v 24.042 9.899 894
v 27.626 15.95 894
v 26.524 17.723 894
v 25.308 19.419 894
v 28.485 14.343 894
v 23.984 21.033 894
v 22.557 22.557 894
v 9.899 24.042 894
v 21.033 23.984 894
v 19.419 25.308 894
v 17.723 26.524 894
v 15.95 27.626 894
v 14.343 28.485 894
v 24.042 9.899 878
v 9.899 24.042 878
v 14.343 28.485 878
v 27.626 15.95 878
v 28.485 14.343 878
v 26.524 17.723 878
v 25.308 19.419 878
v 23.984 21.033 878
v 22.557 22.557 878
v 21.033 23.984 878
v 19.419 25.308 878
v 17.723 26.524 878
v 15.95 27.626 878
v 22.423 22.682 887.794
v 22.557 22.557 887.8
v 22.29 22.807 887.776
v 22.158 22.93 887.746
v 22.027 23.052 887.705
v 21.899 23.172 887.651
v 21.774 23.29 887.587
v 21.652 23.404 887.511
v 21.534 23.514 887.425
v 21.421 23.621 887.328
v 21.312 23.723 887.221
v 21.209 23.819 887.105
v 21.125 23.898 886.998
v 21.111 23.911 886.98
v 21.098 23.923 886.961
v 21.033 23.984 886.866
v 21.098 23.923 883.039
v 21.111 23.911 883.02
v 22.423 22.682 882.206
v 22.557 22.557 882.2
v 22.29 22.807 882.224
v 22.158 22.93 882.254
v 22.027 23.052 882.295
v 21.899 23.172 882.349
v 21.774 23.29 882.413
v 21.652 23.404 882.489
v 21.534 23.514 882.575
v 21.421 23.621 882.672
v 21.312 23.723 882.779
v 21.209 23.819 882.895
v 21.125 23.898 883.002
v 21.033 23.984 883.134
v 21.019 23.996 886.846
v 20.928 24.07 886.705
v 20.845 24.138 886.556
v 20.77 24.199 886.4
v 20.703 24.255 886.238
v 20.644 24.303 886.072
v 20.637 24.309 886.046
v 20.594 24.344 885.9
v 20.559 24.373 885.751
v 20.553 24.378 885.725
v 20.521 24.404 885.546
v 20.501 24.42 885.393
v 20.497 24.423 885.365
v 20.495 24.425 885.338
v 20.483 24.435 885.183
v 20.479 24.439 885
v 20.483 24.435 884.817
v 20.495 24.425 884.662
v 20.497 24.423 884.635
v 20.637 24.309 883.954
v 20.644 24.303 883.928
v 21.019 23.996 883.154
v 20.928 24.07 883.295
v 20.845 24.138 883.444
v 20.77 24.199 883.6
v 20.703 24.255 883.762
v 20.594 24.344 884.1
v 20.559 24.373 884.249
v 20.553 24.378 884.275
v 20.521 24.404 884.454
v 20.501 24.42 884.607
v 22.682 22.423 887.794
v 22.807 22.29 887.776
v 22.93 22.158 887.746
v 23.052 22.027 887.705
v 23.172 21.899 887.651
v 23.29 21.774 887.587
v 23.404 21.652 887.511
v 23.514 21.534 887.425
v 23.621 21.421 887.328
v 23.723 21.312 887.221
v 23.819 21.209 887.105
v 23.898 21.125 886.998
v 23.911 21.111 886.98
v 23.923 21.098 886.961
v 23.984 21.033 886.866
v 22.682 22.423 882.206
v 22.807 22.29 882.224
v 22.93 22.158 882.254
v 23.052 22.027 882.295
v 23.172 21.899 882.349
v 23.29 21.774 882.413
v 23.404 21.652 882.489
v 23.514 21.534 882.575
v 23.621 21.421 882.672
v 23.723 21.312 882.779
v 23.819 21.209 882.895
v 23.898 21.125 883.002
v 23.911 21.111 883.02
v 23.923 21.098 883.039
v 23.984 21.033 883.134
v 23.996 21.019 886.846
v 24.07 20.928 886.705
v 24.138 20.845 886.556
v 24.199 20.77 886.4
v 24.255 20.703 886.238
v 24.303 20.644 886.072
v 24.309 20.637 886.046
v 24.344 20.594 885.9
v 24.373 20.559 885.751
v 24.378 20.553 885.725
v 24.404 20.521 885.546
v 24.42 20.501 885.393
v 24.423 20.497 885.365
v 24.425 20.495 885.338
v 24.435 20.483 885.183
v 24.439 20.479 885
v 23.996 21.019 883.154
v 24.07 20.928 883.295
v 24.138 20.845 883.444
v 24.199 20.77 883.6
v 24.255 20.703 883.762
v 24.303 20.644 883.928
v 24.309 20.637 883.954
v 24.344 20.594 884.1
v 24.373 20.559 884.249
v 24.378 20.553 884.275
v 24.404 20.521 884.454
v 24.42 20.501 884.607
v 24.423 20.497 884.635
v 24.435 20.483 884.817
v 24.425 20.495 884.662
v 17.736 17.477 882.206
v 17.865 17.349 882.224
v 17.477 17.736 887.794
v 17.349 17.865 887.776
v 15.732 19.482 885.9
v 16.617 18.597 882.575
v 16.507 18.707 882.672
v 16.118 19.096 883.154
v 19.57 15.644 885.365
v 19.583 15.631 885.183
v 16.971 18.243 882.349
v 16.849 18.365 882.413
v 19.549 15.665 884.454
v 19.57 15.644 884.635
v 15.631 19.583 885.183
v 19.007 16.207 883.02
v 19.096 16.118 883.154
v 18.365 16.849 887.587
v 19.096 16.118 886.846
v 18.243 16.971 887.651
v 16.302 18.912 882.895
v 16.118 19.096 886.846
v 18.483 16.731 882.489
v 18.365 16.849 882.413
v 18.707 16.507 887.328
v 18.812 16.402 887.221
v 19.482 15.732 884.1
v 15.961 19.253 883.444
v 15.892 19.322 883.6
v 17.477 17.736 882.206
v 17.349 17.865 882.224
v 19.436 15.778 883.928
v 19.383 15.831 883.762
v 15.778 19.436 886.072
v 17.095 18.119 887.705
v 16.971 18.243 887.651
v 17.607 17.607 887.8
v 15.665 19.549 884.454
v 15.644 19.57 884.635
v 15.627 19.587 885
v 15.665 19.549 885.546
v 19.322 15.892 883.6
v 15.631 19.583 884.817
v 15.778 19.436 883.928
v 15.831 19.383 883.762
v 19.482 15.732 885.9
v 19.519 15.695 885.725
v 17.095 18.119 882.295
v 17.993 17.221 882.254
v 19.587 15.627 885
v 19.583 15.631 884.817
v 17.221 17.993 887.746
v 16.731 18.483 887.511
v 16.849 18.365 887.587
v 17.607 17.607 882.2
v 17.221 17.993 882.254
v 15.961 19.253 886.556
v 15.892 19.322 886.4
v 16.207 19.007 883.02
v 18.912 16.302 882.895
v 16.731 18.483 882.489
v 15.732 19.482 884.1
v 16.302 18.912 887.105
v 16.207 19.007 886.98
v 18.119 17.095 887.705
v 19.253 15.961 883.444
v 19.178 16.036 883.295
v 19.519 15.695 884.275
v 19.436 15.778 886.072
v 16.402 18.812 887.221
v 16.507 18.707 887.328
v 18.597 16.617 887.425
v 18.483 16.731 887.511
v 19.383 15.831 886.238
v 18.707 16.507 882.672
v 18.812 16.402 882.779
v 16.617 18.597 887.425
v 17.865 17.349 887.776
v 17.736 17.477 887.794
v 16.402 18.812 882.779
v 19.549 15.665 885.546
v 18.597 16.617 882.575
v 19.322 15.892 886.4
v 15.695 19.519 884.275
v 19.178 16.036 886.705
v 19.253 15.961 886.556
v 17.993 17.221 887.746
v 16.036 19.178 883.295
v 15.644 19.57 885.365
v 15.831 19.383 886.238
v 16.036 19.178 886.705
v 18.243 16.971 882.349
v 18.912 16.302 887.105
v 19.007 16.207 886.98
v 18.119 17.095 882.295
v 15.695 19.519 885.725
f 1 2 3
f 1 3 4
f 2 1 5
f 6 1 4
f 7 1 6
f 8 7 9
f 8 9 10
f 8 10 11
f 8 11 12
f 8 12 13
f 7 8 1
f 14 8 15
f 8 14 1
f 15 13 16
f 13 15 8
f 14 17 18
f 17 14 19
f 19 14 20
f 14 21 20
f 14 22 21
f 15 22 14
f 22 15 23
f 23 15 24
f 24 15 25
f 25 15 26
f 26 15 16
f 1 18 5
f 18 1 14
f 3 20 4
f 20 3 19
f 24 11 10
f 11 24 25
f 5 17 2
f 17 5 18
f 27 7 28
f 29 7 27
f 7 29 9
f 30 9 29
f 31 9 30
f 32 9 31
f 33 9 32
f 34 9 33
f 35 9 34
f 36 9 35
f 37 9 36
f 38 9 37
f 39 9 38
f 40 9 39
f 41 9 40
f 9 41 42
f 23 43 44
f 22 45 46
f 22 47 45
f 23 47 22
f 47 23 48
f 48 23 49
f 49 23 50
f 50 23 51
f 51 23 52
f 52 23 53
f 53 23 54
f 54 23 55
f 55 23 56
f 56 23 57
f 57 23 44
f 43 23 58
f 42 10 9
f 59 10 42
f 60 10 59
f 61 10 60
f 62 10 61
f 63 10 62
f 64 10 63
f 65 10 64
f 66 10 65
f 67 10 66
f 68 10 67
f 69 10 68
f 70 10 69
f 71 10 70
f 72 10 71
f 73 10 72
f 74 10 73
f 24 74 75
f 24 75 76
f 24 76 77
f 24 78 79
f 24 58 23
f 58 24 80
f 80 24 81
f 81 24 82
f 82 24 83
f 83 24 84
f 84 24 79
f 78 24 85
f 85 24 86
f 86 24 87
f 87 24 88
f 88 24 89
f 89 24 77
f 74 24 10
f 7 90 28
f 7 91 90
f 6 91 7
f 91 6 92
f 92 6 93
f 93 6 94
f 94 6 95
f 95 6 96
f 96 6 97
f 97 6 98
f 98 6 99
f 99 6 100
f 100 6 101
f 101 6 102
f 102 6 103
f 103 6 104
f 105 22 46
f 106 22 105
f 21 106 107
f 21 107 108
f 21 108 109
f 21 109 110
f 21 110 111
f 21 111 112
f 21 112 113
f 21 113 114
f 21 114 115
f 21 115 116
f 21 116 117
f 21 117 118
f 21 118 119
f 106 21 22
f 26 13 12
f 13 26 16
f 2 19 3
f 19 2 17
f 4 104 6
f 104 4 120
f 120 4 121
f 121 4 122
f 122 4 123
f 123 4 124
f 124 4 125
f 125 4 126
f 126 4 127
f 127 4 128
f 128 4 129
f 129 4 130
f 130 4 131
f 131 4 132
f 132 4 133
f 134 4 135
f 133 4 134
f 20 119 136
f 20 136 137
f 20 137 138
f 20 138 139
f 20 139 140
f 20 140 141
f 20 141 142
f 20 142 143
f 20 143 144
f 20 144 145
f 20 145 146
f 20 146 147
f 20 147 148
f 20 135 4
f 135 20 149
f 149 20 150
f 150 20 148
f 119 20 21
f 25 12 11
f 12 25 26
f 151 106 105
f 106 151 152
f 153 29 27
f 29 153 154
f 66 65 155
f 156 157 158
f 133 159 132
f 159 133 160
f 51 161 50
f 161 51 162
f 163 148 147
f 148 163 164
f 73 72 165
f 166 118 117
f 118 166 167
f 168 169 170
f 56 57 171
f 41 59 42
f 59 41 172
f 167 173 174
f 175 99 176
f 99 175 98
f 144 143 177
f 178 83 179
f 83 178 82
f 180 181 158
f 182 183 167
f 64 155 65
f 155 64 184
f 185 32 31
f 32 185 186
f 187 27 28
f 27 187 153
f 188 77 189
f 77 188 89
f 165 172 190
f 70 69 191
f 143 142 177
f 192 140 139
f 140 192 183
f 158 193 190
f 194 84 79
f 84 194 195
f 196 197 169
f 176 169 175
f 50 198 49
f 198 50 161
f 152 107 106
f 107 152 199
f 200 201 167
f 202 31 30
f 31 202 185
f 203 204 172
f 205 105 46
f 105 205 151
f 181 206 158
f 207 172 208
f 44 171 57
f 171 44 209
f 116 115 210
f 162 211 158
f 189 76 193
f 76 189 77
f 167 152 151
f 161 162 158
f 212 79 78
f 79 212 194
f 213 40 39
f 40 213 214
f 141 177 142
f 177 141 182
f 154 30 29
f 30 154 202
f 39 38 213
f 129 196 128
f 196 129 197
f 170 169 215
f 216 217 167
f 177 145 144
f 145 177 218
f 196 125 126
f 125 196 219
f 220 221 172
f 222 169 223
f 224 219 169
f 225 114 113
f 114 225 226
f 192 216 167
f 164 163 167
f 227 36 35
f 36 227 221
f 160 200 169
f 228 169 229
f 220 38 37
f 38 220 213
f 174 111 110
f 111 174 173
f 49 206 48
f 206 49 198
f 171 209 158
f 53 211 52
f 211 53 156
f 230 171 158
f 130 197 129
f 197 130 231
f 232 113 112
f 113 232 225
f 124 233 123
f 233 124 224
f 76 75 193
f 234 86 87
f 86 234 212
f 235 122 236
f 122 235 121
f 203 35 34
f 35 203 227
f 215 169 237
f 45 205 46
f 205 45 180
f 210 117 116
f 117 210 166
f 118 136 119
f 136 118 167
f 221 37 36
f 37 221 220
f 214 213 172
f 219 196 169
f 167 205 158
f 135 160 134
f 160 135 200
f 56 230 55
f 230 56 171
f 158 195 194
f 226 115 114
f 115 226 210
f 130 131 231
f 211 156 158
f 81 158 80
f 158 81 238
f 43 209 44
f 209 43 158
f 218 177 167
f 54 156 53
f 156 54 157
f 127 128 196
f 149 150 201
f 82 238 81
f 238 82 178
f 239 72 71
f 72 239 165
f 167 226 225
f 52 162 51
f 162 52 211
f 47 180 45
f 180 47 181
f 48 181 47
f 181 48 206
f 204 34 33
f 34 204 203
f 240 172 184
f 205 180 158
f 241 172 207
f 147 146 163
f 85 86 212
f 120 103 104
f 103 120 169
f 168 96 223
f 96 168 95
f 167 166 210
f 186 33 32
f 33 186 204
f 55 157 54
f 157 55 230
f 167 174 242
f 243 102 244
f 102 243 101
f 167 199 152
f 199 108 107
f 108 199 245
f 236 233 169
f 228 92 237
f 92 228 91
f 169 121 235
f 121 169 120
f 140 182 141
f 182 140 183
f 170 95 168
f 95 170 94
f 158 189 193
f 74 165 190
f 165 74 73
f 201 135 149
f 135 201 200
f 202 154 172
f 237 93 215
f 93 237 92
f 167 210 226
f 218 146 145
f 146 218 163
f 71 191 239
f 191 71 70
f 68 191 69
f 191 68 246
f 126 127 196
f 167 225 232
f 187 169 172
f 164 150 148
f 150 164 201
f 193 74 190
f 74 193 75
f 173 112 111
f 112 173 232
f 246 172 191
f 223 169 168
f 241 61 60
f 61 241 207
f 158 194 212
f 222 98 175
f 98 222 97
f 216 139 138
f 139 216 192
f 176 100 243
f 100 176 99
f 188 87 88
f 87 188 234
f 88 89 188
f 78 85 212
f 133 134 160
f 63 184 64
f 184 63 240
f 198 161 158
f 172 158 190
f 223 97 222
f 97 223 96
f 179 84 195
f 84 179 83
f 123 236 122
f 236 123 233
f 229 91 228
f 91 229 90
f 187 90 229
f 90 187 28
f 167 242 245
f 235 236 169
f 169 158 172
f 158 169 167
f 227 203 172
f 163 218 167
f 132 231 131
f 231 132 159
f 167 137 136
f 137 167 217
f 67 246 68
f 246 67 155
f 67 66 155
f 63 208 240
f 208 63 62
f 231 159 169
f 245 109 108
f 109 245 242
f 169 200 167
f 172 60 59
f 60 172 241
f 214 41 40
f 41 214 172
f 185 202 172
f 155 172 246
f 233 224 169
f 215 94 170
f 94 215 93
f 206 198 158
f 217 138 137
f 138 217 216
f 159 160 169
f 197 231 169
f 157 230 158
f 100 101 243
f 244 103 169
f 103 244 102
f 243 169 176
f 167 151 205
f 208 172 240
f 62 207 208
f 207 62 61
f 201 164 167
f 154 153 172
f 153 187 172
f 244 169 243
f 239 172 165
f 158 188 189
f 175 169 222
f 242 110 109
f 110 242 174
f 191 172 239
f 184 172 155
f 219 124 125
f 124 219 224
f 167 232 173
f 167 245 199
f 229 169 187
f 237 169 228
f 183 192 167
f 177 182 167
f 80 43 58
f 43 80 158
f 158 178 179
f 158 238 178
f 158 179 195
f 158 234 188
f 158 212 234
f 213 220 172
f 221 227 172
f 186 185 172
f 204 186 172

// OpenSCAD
// file: ../lib/astra66_core.scad
// =============================================================================
// ASTRA-66 CAD rev B -- core library
// Parameters (generated from analysis.py by build.py), derived stations and helpers.
// Every part file includes this; stations mirror analysis.py X[] exactly.
//
// Frame: rocket axis = +Z, STA 0 = nose tip, stations increase aft.
// Angles: measured about +Z from +X toward +Y.  90 deg = switch / hatch side,
// 270 deg = camera side, 45 deg = rail-button line, fins at 0/90/180/270 deg.
// =============================================================================
include <../astra66_params.scad>

$fn = FN;
EPS = 0.01;
CAD_REV = "B";

// ----------------------------------------------------------------- radii
R_OD    = BODY_OD / 2;                 // body tube outer
R_ID    = BODY_ID / 2;                 // body tube inner
R_SH    = (BODY_ID - FIT_SH) / 2;      // printed shoulder / ring OD radius
R_SI    = R_SH - NC_SH_WALL;           // nose shoulder inner radius
R_CO    = CPL_OD / 2;                  // coupler outer
R_CI    = CPL_ID / 2;                  // coupler inner
R_BH_IN = (CPL_ID - 0.2) / 2;          // inner bulkhead disc (fits in coupler)
R_MO    = MMT_OD / 2;
R_MI    = MMT_ID / 2;
R_RING_BORE = (MMT_OD + FIT_SH) / 2;   // centering-ring / core bore
R_TAB_FLOOR = max(R_MO, RET_CLEAR_D / 2);          // rev B: tab clears the COTS retainer
FIN_TAB_H   = R_OD - R_TAB_FLOOR - FIN_TAB_CLR;

// ----------------------------------------------------------------- stations
X_NC_BASE     = NC_L;
X_SH_END      = NC_L + NC_SH_L;
X_PL_END      = NC_L + PL_L;
X_BAND_END    = X_PL_END + AV_BAND_L;
X_END         = X_BAND_END + BO_L;
L_OVERALL     = X_END;                              // airframe length (excl. COTS retainer)
X_CPL_FWD     = X_PL_END - AV_INS;
X_CPL_AFT     = X_BAND_END + AV_INS;
X_AVB_FWD_OUT = X_CPL_FWD - AV_BH_T;                // AV-303 forward face
X_AVB_AFT_OUT = X_CPL_AFT + GASKET_T;               // AV-304 outer-disc forward face
X_AVB_AFT_END = X_AVB_AFT_OUT + AV_BH_T;            // AV-304 aft face (recovery bay starts)
X_SLED_FWD    = X_CPL_FWD + AV_BH_T + SLED_FWD_GAP;
X_SLED_AFT    = X_SLED_FWD + SLED_L;
X_MMT_AFT     = X_END + MMT_AFT_EXT;
X_MMT_FWD     = X_MMT_AFT - MMT_L;
X_FIN_LE      = X_END - FIN_CR;
X_TAB_FWD     = X_FIN_LE + FIN_TAB_FWD;
X_TAB_AFT     = X_END - LOCK_T;
X_CORE_FWD    = X_TAB_FWD - CORE_RING_T;
X_CORE_AFT    = X_END - LOCK_T;
X_NC_SCREW    = NC_L + NC_SH_L / 2;
X_CAM         = X_SH_END + CAM_OFF;
X_HATCH       = X_SH_END + HATCH_OFF;
X_RB_FWD      = X_MMT_FWD - RB_FWD_OFF;
X_RB_AFT      = X_END - RB_AFT_OFF;
X_TRAY_FWD    = X_AVB_FWD_OUT - TRAY_L;
X_SW          = X_PL_END + AV_BAND_L / 2;
X_MOTOR_FWD   = X_MMT_AFT - MOTOR_L;
X_BAT0        = X_SLED_FWD + 2;
BAT_CAGE_L    = 12 + BAT_L + 0.6;
PAYLOAD_BAY_L  = X_AVB_FWD_OUT - X_SH_END;
RECOVERY_BAY_L = X_MMT_FWD - X_AVB_AFT_END;

FIN_ANGLES      = [for (i = [0 : FIN_N - 1]) i * 360 / FIN_N];
LOCK_SCREW_ANG  = [45, 135, 225, 315];
STATIC_PORT_ANG = [45, 135, 225, 315];

// ----------------------------------------------------------------- geometry helpers
function ogive_rho()  = (R_OD * R_OD + NC_L * NC_L) / (2 * R_OD);
function ogive_r(x)   = sqrt(max(pow(ogive_rho(), 2) - pow(NC_L - x, 2), 0)) + R_OD - ogive_rho();

// Solid of revolution of the tangent ogive between stations x0..x1, radially offset inward by off.
module ogive_solid(x0, x1, off = 0, n = 72) {
    s = (x0 == 0) ? 1 : 0;
    rotate_extrude()
        polygon(concat([[0, x0]],
                       [for (i = [s : n]) let(x = x0 + (x1 - x0) * i / n) [max(ogive_r(x) - off, 0.01), x]],
                       [[0, x1]]));
}

module tube_r(ro, ri, z0, z1) {
    translate([0, 0, z0]) difference() {
        cylinder(r = ro, h = z1 - z0);
        translate([0, 0, -1]) cylinder(r = ri, h = z1 - z0 + 2);
    }
}

module at_angle(a) { rotate([0, 0, a]) children(); }

// Cylinder of diameter d along the radial direction at angle a, from radius r0 to r1, at station z.
module radial_cyl(d, z, a, r0, r1) {
    at_angle(a) translate([r0, 0, z]) rotate([0, 90, 0]) cylinder(d = d, h = r1 - r0);
}

module rounded_rect(l, w, r) { offset(r = r) square([l - 2 * r, w - 2 * r], center = true); }

// Radial prism with a rounded-rectangle footprint (l axial x w tangential) centred at station z.
module radial_prism(a, z, l, w, rr, r0, r1) {
    at_angle(a) translate([r0, 0, z]) rotate([0, 90, 0]) linear_extrude(r1 - r0) rounded_rect(l, w, rr);
}

// Block in the radial frame at angle a: radial r0..r1, tangential +/-hw, stations z0..z1, clipped to radius rc.
module radial_block(a, r0, r1, hw, z0, z1, rc) {
    intersection() {
        at_angle(a) translate([r0, -hw, z0]) cube([r1 - r0, 2 * hw, z1 - z0]);
        translate([0, 0, z0 - 1]) cylinder(r = rc, h = z1 - z0 + 2);
    }
}

// Camera frame: child +Z = lens axis (outward, tilted CAM_TILT aft), origin at the lens face centre.
// Lens-face radius CAM_R0 is the smaller of (a) the tilted barrel rim 0.5 mm inside the bore and
// (b) the tilted camera-body corners 0.5 mm inside the bore -- so any CAM_W/CAM_LEN entered fits.
CAM_SETBACK = CAM_LENS_L * cos(CAM_TILT) + (CAM_LENS_HOLE - 1) / 2 * sin(CAM_TILT) + 0.5;
CAM_R0 = min(R_ID - CAM_SETBACK, sqrt(pow(R_ID - 0.5, 2) - pow(CAM_W / 2, 2)) - CAM_LEN / 2 * sin(CAM_TILT));
module cam_frame() {
    at_angle(CAM_ANG) translate([CAM_R0, 0, X_CAM]) rotate([0, 90 - CAM_TILT, 0]) children();
}

echo(str("ASTRA-66 CAD rev ", CAD_REV, ": L_OVERALL=", L_OVERALL, " payload bay=", PAYLOAD_BAY_L,
         " recovery bay=", RECOVERY_BAY_L, " fin tab depth=", FIN_TAB_H));
// main file
// ASTRA-66 CAD rev B -- BO-409 Forward rail-button boss (rail-button mounting structure)
// 20 wide x 16 long x 8 deep saddle bonded to the booster wall against the BO-404 forward face, on RB_ANG;
// M4 heat-set insert installed from the saddle face before bonding. PETG, FDM.
include <../lib/astra66_core.scad>

module BO_409_rail_button_boss() {
    difference() {
        radial_block(RB_ANG, R_ID - 8, R_ID + 1, 10, X_MMT_FWD - 16, X_MMT_FWD, R_ID - 0.1);
        radial_cyl(INS_M4_D, X_RB_FWD, RB_ANG, R_ID - 0.1 - INS_M4_L - 1, R_ID + 1);
    }
}

BO_409_rail_button_boss();
